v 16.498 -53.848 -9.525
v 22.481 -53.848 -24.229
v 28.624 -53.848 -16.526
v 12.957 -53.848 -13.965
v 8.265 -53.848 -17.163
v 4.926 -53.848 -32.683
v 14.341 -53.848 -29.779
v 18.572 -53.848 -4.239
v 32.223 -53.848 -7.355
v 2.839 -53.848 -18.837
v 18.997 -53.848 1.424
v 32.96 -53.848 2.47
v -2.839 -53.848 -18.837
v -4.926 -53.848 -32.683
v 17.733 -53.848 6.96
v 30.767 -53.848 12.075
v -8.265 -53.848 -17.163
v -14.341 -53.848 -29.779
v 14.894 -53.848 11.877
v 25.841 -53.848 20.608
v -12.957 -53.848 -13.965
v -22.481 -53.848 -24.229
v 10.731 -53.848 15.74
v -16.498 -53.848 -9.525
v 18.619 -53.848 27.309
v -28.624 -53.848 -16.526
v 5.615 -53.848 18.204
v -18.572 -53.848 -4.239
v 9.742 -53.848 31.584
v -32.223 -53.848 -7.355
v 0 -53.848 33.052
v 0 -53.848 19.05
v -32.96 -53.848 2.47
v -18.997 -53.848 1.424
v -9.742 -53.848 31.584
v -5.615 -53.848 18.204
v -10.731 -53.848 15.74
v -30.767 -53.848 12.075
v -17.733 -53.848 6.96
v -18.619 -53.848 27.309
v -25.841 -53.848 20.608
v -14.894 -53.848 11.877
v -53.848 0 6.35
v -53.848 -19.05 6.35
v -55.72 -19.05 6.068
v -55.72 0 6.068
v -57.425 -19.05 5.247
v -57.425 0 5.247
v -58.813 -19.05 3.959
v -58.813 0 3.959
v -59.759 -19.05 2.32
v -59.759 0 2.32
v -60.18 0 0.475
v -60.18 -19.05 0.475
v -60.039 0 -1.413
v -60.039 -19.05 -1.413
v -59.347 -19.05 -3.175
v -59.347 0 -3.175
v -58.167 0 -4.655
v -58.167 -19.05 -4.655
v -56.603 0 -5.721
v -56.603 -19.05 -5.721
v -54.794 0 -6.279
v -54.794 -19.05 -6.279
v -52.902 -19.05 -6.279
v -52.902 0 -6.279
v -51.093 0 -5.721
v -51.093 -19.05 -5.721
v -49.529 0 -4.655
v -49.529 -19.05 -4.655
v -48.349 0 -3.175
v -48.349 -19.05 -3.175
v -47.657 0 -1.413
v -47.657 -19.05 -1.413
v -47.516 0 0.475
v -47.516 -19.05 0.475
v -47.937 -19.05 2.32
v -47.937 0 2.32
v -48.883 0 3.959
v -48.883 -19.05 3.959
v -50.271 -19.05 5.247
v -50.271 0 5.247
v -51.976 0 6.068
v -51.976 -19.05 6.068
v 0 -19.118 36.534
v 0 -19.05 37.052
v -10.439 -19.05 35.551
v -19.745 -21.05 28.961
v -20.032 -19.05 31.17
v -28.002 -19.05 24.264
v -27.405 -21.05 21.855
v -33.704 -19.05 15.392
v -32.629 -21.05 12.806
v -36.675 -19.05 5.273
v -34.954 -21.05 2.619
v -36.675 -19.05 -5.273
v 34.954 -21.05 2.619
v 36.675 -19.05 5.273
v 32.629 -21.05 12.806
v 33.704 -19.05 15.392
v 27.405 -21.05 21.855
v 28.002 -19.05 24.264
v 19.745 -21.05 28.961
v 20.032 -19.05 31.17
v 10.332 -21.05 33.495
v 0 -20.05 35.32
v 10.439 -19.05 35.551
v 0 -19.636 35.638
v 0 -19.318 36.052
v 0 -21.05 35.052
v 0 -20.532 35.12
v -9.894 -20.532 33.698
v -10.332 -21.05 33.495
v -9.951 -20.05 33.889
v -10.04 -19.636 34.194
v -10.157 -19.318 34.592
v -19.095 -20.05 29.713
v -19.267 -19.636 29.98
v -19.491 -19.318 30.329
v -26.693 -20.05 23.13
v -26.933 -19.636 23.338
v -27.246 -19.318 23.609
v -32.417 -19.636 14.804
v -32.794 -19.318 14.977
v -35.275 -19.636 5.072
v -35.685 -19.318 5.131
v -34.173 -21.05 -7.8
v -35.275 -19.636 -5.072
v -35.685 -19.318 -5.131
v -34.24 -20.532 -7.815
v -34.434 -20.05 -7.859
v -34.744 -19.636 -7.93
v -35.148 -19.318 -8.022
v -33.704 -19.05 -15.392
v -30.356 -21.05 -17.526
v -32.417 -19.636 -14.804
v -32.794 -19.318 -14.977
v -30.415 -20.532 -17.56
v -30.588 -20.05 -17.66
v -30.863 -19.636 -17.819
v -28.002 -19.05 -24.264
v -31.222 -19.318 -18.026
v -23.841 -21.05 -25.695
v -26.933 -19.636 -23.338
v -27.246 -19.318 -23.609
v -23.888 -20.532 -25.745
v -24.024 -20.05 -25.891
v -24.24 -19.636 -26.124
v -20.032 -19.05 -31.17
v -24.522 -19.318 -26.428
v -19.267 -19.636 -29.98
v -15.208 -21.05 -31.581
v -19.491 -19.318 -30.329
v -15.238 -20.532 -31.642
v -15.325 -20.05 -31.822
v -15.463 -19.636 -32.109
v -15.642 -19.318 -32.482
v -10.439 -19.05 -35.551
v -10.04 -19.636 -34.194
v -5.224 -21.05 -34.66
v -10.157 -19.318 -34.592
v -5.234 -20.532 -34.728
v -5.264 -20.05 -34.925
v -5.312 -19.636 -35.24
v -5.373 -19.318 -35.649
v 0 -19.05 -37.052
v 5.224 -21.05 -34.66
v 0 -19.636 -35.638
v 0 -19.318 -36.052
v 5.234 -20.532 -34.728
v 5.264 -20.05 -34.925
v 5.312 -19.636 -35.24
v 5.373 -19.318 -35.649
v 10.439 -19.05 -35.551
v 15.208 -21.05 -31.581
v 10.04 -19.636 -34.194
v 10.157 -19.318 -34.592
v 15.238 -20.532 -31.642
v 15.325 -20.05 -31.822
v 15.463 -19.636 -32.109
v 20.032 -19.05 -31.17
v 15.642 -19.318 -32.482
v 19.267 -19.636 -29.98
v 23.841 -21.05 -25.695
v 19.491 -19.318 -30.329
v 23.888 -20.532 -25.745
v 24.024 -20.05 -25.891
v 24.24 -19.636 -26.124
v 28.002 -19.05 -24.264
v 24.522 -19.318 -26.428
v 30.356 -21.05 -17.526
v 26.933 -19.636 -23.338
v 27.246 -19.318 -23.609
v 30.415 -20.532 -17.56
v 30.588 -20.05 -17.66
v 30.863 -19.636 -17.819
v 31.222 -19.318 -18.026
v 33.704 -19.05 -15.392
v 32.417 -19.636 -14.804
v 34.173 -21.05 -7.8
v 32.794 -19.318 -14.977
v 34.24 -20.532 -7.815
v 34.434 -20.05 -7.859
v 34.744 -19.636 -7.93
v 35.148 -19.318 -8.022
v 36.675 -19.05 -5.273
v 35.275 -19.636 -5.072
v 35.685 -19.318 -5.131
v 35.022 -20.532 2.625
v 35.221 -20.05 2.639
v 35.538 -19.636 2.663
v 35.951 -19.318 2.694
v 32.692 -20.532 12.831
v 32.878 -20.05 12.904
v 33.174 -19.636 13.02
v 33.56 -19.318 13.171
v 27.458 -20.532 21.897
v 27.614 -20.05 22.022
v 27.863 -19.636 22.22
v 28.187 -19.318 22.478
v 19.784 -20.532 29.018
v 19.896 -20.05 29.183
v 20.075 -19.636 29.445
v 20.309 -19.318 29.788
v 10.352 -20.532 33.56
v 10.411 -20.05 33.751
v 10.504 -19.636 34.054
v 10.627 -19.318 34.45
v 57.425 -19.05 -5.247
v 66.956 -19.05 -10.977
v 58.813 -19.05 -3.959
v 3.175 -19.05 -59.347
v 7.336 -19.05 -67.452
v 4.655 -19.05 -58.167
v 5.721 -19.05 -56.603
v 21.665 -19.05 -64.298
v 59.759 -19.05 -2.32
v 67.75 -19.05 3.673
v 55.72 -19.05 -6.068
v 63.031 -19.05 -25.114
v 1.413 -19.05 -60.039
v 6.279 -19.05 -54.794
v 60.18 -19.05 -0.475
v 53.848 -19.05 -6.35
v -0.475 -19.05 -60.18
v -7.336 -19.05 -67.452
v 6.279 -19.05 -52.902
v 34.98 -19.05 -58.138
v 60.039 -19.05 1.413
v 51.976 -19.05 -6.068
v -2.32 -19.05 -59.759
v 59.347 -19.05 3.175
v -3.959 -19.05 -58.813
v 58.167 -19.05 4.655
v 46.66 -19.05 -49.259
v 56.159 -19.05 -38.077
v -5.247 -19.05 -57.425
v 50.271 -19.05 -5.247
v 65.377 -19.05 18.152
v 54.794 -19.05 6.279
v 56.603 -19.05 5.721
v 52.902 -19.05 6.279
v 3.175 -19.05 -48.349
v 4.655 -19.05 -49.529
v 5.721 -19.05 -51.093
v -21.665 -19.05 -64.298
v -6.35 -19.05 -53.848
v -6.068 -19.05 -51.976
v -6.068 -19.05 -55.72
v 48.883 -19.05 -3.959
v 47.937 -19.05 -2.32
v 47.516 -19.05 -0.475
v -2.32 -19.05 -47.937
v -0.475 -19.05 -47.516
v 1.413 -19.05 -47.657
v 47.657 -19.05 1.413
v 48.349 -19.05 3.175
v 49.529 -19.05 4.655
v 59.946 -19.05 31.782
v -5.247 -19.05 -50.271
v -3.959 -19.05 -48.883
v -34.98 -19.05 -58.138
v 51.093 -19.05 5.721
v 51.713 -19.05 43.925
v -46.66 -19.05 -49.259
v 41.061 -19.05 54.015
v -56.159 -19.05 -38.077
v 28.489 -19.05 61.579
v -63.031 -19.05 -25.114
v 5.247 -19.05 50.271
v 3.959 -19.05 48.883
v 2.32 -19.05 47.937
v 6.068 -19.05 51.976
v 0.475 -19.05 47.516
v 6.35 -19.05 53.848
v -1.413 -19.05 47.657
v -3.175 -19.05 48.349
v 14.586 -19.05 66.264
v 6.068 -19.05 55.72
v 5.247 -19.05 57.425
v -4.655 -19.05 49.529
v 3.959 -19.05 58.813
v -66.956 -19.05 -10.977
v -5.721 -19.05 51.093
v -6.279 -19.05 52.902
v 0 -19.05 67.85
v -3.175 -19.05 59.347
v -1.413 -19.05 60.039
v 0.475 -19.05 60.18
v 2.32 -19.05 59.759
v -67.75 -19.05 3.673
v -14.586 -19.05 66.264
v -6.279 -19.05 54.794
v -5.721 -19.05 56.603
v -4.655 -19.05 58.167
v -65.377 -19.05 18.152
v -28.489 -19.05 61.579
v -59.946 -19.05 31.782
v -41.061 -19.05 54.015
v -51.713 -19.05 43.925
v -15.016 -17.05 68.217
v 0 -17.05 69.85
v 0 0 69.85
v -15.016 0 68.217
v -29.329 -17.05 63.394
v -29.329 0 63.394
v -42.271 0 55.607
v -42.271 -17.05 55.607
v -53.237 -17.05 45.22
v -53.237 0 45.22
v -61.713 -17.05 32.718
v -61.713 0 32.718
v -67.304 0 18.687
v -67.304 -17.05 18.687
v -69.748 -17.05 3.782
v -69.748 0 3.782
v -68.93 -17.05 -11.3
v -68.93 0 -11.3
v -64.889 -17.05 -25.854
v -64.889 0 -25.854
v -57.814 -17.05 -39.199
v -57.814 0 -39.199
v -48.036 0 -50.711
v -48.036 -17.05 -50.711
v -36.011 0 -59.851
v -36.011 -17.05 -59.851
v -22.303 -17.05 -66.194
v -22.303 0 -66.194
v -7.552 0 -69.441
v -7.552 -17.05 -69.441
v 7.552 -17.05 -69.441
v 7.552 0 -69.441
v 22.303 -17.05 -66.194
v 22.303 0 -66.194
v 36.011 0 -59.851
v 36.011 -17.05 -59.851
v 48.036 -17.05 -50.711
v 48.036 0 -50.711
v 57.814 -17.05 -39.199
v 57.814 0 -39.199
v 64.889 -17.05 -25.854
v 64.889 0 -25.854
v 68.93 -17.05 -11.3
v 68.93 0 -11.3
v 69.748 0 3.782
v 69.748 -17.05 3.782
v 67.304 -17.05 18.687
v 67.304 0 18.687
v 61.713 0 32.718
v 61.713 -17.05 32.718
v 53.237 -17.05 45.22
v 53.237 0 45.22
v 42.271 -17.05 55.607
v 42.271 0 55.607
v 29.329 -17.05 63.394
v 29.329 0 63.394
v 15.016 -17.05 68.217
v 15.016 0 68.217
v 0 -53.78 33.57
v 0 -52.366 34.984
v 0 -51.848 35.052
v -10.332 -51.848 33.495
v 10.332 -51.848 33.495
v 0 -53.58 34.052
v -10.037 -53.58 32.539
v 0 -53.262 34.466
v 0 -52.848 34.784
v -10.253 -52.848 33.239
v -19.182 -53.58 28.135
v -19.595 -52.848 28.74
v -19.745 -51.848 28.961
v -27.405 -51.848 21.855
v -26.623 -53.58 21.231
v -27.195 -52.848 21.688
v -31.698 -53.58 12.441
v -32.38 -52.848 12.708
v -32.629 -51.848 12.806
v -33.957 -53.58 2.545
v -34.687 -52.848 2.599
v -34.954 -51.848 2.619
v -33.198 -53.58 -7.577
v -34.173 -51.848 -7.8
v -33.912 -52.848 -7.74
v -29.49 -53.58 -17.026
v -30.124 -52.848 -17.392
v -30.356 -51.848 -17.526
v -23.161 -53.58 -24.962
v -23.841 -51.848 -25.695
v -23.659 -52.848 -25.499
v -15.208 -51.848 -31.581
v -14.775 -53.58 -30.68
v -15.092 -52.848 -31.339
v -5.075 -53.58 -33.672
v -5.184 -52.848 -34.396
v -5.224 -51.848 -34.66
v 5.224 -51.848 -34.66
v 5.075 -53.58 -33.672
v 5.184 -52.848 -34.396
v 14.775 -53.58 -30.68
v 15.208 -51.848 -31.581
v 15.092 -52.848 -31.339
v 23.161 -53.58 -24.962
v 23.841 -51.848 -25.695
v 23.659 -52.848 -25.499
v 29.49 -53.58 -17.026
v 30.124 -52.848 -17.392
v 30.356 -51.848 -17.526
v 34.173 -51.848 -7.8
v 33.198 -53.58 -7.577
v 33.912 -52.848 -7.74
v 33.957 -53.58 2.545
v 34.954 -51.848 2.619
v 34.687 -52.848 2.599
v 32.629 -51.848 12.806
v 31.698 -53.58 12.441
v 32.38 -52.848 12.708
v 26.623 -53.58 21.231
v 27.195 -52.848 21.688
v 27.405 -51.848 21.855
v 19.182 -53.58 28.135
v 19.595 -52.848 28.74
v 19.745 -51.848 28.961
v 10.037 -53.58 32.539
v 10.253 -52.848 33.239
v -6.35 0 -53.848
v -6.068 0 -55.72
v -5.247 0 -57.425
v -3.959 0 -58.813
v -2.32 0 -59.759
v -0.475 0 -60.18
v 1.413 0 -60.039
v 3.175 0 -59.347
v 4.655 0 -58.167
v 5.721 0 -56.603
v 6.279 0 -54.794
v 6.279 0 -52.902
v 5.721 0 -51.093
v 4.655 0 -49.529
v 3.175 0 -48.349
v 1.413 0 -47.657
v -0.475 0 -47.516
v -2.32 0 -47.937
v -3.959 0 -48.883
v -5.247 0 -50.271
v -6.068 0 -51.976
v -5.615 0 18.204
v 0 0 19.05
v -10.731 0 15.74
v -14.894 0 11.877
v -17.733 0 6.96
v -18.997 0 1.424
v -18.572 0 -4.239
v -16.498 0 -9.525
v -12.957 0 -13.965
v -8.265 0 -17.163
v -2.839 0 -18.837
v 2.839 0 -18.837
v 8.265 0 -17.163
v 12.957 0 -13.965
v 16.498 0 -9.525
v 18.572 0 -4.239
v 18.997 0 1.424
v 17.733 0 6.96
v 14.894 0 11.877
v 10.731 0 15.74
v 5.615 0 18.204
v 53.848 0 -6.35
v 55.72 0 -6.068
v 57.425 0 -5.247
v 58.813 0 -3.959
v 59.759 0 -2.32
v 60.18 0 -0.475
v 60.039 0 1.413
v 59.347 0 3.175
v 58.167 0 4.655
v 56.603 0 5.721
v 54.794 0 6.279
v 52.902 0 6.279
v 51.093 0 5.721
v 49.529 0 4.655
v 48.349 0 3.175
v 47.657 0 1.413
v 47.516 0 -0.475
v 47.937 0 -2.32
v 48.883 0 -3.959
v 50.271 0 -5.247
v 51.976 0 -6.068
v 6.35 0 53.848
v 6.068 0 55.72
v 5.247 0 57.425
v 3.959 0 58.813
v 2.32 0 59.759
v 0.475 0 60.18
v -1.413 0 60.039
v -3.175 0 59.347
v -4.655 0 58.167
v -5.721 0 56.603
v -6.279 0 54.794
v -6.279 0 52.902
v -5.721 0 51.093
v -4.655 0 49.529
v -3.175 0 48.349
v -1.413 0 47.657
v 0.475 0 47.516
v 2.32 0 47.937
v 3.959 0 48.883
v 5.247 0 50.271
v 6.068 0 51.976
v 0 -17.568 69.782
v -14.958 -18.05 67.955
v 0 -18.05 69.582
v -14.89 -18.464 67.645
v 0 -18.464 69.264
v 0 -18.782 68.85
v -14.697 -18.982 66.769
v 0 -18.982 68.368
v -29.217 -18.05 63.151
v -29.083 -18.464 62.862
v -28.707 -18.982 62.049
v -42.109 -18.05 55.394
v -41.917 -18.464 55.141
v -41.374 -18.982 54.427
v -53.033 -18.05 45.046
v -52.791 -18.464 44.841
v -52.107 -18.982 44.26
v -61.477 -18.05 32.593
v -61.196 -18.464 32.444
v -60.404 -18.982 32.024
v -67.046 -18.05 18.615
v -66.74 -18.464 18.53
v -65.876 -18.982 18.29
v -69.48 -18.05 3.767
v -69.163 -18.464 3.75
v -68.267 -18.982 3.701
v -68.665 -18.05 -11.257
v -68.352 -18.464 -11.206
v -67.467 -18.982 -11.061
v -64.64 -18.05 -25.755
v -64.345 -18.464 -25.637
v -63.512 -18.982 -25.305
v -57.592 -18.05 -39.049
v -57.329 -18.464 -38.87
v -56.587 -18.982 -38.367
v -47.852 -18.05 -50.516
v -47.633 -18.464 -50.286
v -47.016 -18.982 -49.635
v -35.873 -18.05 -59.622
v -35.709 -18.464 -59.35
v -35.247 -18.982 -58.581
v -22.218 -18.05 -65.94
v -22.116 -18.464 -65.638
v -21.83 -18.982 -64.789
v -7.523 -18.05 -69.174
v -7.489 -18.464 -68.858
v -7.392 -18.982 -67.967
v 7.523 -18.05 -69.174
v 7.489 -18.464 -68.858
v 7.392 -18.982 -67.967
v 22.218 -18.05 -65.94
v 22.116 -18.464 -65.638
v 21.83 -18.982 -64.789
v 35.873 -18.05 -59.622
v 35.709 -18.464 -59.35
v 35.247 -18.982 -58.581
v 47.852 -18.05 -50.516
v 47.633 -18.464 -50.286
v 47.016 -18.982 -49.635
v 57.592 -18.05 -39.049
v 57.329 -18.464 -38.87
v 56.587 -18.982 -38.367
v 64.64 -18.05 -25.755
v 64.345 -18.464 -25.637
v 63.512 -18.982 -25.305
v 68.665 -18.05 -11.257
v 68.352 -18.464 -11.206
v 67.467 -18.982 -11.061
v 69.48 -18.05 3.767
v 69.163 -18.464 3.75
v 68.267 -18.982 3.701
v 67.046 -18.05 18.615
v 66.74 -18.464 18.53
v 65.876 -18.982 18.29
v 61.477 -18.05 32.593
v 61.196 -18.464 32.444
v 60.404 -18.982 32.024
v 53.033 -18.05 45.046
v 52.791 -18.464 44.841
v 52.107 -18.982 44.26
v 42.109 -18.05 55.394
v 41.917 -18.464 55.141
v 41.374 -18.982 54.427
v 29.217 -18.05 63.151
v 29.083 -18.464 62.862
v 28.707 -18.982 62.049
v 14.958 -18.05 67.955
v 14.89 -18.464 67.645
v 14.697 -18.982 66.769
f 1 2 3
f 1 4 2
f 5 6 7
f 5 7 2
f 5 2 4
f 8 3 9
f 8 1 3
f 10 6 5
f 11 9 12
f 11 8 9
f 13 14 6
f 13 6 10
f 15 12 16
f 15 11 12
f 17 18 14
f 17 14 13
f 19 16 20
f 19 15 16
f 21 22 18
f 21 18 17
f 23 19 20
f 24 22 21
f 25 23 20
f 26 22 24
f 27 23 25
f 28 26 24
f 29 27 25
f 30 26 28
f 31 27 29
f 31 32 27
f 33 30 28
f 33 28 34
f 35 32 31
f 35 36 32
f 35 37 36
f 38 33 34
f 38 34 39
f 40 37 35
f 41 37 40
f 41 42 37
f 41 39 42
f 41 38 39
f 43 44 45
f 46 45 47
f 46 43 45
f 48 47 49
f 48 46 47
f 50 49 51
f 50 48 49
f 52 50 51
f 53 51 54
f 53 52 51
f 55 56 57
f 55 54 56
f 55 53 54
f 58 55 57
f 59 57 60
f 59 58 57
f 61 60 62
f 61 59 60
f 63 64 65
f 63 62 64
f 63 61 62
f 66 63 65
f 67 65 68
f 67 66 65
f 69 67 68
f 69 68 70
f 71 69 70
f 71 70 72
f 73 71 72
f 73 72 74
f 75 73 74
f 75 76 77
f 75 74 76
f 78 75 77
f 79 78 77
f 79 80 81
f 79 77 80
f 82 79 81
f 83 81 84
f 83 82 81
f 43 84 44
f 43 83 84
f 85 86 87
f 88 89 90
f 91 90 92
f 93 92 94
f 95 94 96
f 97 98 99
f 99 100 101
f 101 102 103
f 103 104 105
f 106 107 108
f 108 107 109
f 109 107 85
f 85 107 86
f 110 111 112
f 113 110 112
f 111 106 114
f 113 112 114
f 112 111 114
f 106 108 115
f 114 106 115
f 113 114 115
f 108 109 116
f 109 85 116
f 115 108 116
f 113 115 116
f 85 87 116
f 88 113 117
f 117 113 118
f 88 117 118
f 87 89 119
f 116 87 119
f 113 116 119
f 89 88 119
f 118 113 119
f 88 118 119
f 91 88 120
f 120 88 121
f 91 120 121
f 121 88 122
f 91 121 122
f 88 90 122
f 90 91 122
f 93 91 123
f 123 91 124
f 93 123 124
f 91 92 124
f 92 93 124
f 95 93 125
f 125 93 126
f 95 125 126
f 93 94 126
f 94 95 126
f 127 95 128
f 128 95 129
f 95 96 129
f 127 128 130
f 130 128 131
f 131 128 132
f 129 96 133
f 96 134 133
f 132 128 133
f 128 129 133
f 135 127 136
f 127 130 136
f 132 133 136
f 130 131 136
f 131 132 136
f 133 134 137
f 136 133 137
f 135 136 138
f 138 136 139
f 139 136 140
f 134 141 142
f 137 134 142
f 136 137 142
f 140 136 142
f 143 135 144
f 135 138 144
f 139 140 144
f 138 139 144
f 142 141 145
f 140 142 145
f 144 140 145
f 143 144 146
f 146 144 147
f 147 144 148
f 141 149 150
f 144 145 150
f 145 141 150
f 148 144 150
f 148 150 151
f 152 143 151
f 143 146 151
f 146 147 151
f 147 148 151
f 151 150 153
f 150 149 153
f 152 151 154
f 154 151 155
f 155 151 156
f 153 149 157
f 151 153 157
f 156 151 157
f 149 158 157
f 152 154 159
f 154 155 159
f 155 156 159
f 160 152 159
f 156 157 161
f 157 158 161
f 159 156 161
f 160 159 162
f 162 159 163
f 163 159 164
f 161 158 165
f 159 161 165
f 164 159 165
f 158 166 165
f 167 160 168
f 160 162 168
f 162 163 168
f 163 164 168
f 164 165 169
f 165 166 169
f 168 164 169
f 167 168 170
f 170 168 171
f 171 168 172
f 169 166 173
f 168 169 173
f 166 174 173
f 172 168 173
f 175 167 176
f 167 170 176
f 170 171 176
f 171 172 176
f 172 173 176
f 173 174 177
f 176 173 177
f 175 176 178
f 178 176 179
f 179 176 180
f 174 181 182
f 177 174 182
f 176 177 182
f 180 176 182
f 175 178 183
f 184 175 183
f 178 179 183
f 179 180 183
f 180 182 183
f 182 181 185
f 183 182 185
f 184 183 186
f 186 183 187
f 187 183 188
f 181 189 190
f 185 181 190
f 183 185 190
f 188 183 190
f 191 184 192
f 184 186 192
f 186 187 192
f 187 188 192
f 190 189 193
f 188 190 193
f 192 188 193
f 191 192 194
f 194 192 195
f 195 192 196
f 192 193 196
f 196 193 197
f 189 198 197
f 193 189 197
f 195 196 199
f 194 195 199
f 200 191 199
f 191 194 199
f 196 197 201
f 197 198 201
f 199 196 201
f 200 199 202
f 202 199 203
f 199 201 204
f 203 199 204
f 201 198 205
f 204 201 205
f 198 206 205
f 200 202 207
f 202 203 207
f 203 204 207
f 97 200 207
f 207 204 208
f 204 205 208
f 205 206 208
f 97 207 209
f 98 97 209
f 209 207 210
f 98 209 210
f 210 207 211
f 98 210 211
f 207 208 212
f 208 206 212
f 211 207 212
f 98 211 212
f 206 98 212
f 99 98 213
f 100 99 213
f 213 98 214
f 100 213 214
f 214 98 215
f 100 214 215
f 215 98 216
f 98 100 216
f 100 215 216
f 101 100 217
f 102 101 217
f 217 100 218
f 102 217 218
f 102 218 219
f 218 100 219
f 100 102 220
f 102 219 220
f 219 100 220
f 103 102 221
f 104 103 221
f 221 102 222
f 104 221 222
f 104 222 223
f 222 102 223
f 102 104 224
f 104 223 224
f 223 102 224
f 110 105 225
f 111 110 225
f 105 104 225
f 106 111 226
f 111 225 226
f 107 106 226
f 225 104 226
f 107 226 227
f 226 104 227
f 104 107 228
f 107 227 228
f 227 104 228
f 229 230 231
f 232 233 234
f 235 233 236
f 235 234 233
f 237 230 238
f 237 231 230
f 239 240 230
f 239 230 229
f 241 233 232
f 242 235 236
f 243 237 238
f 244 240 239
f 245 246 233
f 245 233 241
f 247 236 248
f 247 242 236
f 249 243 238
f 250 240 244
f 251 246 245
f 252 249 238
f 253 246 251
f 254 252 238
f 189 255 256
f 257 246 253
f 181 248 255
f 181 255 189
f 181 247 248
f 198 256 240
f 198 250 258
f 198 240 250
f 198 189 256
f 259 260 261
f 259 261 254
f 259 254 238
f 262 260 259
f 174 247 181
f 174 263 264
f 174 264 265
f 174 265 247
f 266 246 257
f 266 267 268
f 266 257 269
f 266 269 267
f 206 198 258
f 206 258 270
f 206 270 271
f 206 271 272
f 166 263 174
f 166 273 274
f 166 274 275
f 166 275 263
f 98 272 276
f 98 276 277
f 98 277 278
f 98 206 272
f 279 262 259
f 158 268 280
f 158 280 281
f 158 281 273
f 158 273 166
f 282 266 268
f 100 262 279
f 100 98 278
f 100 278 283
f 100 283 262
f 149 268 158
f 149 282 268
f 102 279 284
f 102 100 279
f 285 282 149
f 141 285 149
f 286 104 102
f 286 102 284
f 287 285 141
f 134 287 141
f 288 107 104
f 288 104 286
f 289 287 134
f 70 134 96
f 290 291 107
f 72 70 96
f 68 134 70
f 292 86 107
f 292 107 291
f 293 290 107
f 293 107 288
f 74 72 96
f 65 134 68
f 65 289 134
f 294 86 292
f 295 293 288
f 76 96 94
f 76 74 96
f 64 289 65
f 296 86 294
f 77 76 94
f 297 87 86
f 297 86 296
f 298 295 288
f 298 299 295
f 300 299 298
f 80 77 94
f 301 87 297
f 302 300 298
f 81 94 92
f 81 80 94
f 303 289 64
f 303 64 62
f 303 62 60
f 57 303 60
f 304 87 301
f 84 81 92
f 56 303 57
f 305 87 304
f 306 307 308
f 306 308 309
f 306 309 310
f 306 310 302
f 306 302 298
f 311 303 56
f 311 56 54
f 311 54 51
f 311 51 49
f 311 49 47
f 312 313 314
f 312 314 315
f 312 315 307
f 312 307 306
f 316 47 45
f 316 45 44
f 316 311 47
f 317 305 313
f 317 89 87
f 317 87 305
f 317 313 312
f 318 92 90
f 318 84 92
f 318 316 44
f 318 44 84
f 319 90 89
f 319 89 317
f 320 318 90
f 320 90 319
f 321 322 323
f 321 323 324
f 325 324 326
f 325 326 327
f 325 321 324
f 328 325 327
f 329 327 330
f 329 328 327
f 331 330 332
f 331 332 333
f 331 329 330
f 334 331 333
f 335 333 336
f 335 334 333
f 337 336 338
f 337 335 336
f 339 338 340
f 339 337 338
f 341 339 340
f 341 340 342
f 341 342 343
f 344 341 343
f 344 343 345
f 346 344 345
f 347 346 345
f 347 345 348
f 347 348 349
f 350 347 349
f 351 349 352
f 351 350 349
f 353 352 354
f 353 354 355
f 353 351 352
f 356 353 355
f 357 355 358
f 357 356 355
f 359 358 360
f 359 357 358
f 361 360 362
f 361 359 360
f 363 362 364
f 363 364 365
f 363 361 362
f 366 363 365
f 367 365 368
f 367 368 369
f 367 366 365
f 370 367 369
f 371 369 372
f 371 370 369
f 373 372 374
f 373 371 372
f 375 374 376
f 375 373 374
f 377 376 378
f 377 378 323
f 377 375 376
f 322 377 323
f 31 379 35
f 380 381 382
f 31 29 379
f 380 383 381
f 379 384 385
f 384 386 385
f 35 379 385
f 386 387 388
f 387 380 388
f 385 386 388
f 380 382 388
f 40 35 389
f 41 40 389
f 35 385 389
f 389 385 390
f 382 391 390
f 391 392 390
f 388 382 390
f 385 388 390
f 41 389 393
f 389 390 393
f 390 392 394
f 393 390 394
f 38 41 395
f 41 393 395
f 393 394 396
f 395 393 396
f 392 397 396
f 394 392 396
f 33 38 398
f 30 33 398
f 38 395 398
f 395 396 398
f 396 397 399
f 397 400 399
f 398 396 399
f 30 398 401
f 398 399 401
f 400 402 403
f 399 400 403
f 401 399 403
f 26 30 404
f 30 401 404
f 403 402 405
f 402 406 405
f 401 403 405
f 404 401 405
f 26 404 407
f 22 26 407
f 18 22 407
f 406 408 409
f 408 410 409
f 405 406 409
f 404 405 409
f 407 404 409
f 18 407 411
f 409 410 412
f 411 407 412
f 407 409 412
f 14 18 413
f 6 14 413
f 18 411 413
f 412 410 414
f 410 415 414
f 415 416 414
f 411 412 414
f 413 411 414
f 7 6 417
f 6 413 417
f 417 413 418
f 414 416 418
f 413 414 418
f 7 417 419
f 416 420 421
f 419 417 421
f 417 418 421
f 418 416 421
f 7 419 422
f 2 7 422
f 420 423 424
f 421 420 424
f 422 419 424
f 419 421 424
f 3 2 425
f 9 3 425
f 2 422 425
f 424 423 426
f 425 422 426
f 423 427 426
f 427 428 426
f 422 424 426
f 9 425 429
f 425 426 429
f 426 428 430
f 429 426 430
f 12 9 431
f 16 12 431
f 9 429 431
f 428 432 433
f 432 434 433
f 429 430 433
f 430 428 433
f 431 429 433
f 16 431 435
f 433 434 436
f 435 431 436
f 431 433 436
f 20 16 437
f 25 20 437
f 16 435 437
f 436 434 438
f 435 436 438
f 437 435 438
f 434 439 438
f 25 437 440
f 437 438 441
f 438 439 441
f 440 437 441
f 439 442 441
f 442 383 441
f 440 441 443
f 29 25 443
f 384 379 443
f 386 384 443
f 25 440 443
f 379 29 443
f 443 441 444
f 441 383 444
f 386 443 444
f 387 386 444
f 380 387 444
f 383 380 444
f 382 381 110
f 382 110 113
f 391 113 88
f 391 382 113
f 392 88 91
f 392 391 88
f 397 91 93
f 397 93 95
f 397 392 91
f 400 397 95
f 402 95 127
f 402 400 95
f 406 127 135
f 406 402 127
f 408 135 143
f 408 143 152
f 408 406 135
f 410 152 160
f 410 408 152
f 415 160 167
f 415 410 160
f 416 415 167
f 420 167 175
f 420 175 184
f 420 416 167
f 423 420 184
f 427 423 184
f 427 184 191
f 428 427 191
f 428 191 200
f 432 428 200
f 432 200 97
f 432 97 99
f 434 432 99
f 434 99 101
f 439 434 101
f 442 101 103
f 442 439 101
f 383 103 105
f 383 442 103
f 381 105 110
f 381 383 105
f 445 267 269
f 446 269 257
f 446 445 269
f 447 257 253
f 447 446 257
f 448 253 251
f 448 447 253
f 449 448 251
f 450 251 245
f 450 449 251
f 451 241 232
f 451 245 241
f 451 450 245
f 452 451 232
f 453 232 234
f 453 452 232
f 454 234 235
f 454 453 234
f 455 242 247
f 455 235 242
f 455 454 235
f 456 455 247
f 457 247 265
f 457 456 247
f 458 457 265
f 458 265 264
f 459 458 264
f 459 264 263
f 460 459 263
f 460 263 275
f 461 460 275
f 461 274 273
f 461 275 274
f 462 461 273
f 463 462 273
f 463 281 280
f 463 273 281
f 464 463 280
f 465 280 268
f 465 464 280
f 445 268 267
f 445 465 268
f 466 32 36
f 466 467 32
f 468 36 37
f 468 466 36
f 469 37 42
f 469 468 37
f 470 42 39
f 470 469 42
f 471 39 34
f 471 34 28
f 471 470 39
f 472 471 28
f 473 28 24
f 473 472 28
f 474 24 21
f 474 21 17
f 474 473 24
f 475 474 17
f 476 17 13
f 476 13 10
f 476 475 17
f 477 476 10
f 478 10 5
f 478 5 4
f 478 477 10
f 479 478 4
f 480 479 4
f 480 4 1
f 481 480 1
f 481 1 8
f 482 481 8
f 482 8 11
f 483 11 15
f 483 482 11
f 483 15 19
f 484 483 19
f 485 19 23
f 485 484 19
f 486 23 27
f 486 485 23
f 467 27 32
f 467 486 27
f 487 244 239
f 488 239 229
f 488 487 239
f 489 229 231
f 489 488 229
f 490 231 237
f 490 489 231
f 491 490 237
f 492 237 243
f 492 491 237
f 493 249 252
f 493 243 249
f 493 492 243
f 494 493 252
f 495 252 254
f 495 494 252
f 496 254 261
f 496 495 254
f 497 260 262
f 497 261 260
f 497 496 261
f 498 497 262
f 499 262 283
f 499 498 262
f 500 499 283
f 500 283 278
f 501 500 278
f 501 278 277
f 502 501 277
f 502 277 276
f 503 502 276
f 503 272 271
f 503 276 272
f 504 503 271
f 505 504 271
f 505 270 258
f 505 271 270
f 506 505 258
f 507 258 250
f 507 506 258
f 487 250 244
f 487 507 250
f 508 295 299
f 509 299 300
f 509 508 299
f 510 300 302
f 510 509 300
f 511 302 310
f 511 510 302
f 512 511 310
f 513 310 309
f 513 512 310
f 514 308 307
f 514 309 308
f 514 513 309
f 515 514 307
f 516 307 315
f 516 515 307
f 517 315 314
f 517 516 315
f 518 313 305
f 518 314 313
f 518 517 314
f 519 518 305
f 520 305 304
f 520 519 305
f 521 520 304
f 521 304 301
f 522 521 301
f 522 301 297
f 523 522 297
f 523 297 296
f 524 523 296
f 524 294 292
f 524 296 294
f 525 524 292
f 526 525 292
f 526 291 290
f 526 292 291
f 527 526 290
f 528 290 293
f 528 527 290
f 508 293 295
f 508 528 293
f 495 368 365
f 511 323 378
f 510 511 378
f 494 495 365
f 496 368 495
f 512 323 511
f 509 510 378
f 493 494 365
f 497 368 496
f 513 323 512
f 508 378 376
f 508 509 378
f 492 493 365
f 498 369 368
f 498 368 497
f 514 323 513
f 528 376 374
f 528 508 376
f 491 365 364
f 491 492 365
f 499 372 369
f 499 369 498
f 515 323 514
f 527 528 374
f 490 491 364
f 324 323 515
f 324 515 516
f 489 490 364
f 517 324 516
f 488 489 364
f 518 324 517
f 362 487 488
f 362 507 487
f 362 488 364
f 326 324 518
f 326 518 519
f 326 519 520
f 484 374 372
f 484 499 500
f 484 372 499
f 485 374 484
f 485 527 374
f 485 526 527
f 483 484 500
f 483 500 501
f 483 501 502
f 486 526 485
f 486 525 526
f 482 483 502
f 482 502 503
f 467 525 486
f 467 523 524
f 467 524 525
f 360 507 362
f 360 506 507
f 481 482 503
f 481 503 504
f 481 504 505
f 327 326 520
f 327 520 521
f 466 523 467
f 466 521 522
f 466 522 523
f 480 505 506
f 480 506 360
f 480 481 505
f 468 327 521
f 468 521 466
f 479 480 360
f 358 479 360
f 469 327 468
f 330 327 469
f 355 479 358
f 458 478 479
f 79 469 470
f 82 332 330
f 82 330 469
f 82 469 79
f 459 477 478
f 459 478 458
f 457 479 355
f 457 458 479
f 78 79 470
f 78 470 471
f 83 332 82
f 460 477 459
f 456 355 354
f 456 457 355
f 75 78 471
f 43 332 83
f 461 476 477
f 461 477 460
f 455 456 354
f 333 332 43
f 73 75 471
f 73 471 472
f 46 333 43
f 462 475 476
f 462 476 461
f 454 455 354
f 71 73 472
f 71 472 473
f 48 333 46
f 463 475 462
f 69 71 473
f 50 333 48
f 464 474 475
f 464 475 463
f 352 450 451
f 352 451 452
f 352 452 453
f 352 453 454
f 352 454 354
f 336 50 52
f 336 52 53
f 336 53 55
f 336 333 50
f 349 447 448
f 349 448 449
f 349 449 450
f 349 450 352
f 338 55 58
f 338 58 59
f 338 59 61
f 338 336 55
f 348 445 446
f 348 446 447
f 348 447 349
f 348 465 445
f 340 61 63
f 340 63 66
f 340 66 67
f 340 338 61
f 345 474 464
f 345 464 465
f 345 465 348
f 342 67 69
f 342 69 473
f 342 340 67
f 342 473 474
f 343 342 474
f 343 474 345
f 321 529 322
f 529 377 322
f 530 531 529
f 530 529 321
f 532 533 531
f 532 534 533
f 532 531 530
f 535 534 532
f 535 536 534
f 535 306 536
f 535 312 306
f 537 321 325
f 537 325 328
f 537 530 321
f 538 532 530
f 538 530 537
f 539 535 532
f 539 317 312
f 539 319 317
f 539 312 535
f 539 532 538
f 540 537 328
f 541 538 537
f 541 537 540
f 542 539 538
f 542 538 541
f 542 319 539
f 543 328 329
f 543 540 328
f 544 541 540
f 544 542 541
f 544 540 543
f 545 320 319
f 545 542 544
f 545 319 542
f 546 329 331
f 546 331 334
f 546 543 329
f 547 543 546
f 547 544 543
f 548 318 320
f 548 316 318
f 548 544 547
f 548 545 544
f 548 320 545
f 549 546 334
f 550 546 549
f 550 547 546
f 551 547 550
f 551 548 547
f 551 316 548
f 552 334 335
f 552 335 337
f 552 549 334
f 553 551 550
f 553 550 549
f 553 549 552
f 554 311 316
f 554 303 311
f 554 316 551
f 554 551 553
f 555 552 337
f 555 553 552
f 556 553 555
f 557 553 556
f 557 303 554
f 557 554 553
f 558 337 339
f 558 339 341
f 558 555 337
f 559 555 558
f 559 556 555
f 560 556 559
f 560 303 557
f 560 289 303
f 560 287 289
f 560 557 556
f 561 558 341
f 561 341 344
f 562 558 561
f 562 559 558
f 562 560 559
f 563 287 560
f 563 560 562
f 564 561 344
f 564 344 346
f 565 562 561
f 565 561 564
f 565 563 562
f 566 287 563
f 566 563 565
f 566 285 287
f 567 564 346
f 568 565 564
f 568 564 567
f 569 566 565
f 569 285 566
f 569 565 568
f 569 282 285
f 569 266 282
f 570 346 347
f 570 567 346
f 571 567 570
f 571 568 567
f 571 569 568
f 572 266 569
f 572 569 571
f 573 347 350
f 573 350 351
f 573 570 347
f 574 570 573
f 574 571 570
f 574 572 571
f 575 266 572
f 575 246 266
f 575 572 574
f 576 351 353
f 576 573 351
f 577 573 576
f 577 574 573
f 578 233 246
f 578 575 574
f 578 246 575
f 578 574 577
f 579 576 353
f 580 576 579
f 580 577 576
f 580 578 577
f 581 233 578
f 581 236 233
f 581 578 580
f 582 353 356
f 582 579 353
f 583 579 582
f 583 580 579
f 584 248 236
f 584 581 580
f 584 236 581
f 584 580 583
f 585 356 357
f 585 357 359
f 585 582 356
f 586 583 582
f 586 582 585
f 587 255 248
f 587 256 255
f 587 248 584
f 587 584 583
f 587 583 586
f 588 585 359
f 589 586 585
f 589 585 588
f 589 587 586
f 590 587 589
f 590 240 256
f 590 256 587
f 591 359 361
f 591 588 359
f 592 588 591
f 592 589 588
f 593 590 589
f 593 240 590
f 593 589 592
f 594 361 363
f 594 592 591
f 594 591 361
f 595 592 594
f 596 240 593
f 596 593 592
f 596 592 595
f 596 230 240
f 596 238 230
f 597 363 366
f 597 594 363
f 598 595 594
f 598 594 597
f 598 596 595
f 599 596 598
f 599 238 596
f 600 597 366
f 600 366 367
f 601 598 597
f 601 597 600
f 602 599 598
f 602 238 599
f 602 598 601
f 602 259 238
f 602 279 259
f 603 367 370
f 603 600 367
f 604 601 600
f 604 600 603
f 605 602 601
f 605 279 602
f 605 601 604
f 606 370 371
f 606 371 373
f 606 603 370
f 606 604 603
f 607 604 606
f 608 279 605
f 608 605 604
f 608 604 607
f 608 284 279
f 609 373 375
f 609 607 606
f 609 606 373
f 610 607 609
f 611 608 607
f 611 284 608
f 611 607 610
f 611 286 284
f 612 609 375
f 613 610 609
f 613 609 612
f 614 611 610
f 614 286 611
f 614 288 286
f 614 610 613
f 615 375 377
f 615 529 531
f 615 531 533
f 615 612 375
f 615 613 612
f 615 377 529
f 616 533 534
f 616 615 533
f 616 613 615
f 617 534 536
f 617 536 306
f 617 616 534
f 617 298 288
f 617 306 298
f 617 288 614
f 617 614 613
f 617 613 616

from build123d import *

# Parameters (mm, degrees)
F2_R            = 63.5
F2_R_2          = 6.35
F3_DEPTH        = 53.849
F3_COPIES_COUNT = 4
F4_R            = 2


# Not quite as in the source:
# - a pattern or mirror of a feature is missing from the dataset's text; its kind, count and spacing are read off the source's solid
# - a feature names something its author has since deleted; it is built from what else it names


with BuildPart() as f1:
    # F0 (on Right) → F1 (revolve)
    with BuildSketch(Plane.YZ):
        Polygon((-53.848, 19.05), (0, 19.05), (0, 69.85), (-19.05, 69.85), (-19.05, 35.052), (-53.848, 35.052), align=None)
    revolve(axis=Axis((0, -26.924, 0), (0, -1, 0)))

    # F2 (on Front) → F3 (cut, through all)
    with BuildSketch(Plane.XZ):
        with Locations((0, 265.2071825894)):
            Circle(F2_R)
        with Locations((0, 53.848)):
            Circle(F2_R_2)
    f3 = extrude(amount=F3_DEPTH, mode=Mode.SUBTRACT)

    # F3_copies: F3 ×4 about axis
    f3_copies_axis = Axis((0, 0, 0), (0, 1, 0))
    for i in range(1, F3_COPIES_COUNT):
        add(f3.rotate(f3_copies_axis, i * 360 / F3_COPIES_COUNT), mode=Mode.SUBTRACT)

    # F4
    f4_edges = [f1.edges().sort_by_distance(p)[0] for p in [
        (0, -19.05, -69.85),
        (0, -19.05, -35.052),
        (0, -53.848, -35.052),
    ]]
    fillet(f4_edges, radius=F4_R)


solid = f1.part
